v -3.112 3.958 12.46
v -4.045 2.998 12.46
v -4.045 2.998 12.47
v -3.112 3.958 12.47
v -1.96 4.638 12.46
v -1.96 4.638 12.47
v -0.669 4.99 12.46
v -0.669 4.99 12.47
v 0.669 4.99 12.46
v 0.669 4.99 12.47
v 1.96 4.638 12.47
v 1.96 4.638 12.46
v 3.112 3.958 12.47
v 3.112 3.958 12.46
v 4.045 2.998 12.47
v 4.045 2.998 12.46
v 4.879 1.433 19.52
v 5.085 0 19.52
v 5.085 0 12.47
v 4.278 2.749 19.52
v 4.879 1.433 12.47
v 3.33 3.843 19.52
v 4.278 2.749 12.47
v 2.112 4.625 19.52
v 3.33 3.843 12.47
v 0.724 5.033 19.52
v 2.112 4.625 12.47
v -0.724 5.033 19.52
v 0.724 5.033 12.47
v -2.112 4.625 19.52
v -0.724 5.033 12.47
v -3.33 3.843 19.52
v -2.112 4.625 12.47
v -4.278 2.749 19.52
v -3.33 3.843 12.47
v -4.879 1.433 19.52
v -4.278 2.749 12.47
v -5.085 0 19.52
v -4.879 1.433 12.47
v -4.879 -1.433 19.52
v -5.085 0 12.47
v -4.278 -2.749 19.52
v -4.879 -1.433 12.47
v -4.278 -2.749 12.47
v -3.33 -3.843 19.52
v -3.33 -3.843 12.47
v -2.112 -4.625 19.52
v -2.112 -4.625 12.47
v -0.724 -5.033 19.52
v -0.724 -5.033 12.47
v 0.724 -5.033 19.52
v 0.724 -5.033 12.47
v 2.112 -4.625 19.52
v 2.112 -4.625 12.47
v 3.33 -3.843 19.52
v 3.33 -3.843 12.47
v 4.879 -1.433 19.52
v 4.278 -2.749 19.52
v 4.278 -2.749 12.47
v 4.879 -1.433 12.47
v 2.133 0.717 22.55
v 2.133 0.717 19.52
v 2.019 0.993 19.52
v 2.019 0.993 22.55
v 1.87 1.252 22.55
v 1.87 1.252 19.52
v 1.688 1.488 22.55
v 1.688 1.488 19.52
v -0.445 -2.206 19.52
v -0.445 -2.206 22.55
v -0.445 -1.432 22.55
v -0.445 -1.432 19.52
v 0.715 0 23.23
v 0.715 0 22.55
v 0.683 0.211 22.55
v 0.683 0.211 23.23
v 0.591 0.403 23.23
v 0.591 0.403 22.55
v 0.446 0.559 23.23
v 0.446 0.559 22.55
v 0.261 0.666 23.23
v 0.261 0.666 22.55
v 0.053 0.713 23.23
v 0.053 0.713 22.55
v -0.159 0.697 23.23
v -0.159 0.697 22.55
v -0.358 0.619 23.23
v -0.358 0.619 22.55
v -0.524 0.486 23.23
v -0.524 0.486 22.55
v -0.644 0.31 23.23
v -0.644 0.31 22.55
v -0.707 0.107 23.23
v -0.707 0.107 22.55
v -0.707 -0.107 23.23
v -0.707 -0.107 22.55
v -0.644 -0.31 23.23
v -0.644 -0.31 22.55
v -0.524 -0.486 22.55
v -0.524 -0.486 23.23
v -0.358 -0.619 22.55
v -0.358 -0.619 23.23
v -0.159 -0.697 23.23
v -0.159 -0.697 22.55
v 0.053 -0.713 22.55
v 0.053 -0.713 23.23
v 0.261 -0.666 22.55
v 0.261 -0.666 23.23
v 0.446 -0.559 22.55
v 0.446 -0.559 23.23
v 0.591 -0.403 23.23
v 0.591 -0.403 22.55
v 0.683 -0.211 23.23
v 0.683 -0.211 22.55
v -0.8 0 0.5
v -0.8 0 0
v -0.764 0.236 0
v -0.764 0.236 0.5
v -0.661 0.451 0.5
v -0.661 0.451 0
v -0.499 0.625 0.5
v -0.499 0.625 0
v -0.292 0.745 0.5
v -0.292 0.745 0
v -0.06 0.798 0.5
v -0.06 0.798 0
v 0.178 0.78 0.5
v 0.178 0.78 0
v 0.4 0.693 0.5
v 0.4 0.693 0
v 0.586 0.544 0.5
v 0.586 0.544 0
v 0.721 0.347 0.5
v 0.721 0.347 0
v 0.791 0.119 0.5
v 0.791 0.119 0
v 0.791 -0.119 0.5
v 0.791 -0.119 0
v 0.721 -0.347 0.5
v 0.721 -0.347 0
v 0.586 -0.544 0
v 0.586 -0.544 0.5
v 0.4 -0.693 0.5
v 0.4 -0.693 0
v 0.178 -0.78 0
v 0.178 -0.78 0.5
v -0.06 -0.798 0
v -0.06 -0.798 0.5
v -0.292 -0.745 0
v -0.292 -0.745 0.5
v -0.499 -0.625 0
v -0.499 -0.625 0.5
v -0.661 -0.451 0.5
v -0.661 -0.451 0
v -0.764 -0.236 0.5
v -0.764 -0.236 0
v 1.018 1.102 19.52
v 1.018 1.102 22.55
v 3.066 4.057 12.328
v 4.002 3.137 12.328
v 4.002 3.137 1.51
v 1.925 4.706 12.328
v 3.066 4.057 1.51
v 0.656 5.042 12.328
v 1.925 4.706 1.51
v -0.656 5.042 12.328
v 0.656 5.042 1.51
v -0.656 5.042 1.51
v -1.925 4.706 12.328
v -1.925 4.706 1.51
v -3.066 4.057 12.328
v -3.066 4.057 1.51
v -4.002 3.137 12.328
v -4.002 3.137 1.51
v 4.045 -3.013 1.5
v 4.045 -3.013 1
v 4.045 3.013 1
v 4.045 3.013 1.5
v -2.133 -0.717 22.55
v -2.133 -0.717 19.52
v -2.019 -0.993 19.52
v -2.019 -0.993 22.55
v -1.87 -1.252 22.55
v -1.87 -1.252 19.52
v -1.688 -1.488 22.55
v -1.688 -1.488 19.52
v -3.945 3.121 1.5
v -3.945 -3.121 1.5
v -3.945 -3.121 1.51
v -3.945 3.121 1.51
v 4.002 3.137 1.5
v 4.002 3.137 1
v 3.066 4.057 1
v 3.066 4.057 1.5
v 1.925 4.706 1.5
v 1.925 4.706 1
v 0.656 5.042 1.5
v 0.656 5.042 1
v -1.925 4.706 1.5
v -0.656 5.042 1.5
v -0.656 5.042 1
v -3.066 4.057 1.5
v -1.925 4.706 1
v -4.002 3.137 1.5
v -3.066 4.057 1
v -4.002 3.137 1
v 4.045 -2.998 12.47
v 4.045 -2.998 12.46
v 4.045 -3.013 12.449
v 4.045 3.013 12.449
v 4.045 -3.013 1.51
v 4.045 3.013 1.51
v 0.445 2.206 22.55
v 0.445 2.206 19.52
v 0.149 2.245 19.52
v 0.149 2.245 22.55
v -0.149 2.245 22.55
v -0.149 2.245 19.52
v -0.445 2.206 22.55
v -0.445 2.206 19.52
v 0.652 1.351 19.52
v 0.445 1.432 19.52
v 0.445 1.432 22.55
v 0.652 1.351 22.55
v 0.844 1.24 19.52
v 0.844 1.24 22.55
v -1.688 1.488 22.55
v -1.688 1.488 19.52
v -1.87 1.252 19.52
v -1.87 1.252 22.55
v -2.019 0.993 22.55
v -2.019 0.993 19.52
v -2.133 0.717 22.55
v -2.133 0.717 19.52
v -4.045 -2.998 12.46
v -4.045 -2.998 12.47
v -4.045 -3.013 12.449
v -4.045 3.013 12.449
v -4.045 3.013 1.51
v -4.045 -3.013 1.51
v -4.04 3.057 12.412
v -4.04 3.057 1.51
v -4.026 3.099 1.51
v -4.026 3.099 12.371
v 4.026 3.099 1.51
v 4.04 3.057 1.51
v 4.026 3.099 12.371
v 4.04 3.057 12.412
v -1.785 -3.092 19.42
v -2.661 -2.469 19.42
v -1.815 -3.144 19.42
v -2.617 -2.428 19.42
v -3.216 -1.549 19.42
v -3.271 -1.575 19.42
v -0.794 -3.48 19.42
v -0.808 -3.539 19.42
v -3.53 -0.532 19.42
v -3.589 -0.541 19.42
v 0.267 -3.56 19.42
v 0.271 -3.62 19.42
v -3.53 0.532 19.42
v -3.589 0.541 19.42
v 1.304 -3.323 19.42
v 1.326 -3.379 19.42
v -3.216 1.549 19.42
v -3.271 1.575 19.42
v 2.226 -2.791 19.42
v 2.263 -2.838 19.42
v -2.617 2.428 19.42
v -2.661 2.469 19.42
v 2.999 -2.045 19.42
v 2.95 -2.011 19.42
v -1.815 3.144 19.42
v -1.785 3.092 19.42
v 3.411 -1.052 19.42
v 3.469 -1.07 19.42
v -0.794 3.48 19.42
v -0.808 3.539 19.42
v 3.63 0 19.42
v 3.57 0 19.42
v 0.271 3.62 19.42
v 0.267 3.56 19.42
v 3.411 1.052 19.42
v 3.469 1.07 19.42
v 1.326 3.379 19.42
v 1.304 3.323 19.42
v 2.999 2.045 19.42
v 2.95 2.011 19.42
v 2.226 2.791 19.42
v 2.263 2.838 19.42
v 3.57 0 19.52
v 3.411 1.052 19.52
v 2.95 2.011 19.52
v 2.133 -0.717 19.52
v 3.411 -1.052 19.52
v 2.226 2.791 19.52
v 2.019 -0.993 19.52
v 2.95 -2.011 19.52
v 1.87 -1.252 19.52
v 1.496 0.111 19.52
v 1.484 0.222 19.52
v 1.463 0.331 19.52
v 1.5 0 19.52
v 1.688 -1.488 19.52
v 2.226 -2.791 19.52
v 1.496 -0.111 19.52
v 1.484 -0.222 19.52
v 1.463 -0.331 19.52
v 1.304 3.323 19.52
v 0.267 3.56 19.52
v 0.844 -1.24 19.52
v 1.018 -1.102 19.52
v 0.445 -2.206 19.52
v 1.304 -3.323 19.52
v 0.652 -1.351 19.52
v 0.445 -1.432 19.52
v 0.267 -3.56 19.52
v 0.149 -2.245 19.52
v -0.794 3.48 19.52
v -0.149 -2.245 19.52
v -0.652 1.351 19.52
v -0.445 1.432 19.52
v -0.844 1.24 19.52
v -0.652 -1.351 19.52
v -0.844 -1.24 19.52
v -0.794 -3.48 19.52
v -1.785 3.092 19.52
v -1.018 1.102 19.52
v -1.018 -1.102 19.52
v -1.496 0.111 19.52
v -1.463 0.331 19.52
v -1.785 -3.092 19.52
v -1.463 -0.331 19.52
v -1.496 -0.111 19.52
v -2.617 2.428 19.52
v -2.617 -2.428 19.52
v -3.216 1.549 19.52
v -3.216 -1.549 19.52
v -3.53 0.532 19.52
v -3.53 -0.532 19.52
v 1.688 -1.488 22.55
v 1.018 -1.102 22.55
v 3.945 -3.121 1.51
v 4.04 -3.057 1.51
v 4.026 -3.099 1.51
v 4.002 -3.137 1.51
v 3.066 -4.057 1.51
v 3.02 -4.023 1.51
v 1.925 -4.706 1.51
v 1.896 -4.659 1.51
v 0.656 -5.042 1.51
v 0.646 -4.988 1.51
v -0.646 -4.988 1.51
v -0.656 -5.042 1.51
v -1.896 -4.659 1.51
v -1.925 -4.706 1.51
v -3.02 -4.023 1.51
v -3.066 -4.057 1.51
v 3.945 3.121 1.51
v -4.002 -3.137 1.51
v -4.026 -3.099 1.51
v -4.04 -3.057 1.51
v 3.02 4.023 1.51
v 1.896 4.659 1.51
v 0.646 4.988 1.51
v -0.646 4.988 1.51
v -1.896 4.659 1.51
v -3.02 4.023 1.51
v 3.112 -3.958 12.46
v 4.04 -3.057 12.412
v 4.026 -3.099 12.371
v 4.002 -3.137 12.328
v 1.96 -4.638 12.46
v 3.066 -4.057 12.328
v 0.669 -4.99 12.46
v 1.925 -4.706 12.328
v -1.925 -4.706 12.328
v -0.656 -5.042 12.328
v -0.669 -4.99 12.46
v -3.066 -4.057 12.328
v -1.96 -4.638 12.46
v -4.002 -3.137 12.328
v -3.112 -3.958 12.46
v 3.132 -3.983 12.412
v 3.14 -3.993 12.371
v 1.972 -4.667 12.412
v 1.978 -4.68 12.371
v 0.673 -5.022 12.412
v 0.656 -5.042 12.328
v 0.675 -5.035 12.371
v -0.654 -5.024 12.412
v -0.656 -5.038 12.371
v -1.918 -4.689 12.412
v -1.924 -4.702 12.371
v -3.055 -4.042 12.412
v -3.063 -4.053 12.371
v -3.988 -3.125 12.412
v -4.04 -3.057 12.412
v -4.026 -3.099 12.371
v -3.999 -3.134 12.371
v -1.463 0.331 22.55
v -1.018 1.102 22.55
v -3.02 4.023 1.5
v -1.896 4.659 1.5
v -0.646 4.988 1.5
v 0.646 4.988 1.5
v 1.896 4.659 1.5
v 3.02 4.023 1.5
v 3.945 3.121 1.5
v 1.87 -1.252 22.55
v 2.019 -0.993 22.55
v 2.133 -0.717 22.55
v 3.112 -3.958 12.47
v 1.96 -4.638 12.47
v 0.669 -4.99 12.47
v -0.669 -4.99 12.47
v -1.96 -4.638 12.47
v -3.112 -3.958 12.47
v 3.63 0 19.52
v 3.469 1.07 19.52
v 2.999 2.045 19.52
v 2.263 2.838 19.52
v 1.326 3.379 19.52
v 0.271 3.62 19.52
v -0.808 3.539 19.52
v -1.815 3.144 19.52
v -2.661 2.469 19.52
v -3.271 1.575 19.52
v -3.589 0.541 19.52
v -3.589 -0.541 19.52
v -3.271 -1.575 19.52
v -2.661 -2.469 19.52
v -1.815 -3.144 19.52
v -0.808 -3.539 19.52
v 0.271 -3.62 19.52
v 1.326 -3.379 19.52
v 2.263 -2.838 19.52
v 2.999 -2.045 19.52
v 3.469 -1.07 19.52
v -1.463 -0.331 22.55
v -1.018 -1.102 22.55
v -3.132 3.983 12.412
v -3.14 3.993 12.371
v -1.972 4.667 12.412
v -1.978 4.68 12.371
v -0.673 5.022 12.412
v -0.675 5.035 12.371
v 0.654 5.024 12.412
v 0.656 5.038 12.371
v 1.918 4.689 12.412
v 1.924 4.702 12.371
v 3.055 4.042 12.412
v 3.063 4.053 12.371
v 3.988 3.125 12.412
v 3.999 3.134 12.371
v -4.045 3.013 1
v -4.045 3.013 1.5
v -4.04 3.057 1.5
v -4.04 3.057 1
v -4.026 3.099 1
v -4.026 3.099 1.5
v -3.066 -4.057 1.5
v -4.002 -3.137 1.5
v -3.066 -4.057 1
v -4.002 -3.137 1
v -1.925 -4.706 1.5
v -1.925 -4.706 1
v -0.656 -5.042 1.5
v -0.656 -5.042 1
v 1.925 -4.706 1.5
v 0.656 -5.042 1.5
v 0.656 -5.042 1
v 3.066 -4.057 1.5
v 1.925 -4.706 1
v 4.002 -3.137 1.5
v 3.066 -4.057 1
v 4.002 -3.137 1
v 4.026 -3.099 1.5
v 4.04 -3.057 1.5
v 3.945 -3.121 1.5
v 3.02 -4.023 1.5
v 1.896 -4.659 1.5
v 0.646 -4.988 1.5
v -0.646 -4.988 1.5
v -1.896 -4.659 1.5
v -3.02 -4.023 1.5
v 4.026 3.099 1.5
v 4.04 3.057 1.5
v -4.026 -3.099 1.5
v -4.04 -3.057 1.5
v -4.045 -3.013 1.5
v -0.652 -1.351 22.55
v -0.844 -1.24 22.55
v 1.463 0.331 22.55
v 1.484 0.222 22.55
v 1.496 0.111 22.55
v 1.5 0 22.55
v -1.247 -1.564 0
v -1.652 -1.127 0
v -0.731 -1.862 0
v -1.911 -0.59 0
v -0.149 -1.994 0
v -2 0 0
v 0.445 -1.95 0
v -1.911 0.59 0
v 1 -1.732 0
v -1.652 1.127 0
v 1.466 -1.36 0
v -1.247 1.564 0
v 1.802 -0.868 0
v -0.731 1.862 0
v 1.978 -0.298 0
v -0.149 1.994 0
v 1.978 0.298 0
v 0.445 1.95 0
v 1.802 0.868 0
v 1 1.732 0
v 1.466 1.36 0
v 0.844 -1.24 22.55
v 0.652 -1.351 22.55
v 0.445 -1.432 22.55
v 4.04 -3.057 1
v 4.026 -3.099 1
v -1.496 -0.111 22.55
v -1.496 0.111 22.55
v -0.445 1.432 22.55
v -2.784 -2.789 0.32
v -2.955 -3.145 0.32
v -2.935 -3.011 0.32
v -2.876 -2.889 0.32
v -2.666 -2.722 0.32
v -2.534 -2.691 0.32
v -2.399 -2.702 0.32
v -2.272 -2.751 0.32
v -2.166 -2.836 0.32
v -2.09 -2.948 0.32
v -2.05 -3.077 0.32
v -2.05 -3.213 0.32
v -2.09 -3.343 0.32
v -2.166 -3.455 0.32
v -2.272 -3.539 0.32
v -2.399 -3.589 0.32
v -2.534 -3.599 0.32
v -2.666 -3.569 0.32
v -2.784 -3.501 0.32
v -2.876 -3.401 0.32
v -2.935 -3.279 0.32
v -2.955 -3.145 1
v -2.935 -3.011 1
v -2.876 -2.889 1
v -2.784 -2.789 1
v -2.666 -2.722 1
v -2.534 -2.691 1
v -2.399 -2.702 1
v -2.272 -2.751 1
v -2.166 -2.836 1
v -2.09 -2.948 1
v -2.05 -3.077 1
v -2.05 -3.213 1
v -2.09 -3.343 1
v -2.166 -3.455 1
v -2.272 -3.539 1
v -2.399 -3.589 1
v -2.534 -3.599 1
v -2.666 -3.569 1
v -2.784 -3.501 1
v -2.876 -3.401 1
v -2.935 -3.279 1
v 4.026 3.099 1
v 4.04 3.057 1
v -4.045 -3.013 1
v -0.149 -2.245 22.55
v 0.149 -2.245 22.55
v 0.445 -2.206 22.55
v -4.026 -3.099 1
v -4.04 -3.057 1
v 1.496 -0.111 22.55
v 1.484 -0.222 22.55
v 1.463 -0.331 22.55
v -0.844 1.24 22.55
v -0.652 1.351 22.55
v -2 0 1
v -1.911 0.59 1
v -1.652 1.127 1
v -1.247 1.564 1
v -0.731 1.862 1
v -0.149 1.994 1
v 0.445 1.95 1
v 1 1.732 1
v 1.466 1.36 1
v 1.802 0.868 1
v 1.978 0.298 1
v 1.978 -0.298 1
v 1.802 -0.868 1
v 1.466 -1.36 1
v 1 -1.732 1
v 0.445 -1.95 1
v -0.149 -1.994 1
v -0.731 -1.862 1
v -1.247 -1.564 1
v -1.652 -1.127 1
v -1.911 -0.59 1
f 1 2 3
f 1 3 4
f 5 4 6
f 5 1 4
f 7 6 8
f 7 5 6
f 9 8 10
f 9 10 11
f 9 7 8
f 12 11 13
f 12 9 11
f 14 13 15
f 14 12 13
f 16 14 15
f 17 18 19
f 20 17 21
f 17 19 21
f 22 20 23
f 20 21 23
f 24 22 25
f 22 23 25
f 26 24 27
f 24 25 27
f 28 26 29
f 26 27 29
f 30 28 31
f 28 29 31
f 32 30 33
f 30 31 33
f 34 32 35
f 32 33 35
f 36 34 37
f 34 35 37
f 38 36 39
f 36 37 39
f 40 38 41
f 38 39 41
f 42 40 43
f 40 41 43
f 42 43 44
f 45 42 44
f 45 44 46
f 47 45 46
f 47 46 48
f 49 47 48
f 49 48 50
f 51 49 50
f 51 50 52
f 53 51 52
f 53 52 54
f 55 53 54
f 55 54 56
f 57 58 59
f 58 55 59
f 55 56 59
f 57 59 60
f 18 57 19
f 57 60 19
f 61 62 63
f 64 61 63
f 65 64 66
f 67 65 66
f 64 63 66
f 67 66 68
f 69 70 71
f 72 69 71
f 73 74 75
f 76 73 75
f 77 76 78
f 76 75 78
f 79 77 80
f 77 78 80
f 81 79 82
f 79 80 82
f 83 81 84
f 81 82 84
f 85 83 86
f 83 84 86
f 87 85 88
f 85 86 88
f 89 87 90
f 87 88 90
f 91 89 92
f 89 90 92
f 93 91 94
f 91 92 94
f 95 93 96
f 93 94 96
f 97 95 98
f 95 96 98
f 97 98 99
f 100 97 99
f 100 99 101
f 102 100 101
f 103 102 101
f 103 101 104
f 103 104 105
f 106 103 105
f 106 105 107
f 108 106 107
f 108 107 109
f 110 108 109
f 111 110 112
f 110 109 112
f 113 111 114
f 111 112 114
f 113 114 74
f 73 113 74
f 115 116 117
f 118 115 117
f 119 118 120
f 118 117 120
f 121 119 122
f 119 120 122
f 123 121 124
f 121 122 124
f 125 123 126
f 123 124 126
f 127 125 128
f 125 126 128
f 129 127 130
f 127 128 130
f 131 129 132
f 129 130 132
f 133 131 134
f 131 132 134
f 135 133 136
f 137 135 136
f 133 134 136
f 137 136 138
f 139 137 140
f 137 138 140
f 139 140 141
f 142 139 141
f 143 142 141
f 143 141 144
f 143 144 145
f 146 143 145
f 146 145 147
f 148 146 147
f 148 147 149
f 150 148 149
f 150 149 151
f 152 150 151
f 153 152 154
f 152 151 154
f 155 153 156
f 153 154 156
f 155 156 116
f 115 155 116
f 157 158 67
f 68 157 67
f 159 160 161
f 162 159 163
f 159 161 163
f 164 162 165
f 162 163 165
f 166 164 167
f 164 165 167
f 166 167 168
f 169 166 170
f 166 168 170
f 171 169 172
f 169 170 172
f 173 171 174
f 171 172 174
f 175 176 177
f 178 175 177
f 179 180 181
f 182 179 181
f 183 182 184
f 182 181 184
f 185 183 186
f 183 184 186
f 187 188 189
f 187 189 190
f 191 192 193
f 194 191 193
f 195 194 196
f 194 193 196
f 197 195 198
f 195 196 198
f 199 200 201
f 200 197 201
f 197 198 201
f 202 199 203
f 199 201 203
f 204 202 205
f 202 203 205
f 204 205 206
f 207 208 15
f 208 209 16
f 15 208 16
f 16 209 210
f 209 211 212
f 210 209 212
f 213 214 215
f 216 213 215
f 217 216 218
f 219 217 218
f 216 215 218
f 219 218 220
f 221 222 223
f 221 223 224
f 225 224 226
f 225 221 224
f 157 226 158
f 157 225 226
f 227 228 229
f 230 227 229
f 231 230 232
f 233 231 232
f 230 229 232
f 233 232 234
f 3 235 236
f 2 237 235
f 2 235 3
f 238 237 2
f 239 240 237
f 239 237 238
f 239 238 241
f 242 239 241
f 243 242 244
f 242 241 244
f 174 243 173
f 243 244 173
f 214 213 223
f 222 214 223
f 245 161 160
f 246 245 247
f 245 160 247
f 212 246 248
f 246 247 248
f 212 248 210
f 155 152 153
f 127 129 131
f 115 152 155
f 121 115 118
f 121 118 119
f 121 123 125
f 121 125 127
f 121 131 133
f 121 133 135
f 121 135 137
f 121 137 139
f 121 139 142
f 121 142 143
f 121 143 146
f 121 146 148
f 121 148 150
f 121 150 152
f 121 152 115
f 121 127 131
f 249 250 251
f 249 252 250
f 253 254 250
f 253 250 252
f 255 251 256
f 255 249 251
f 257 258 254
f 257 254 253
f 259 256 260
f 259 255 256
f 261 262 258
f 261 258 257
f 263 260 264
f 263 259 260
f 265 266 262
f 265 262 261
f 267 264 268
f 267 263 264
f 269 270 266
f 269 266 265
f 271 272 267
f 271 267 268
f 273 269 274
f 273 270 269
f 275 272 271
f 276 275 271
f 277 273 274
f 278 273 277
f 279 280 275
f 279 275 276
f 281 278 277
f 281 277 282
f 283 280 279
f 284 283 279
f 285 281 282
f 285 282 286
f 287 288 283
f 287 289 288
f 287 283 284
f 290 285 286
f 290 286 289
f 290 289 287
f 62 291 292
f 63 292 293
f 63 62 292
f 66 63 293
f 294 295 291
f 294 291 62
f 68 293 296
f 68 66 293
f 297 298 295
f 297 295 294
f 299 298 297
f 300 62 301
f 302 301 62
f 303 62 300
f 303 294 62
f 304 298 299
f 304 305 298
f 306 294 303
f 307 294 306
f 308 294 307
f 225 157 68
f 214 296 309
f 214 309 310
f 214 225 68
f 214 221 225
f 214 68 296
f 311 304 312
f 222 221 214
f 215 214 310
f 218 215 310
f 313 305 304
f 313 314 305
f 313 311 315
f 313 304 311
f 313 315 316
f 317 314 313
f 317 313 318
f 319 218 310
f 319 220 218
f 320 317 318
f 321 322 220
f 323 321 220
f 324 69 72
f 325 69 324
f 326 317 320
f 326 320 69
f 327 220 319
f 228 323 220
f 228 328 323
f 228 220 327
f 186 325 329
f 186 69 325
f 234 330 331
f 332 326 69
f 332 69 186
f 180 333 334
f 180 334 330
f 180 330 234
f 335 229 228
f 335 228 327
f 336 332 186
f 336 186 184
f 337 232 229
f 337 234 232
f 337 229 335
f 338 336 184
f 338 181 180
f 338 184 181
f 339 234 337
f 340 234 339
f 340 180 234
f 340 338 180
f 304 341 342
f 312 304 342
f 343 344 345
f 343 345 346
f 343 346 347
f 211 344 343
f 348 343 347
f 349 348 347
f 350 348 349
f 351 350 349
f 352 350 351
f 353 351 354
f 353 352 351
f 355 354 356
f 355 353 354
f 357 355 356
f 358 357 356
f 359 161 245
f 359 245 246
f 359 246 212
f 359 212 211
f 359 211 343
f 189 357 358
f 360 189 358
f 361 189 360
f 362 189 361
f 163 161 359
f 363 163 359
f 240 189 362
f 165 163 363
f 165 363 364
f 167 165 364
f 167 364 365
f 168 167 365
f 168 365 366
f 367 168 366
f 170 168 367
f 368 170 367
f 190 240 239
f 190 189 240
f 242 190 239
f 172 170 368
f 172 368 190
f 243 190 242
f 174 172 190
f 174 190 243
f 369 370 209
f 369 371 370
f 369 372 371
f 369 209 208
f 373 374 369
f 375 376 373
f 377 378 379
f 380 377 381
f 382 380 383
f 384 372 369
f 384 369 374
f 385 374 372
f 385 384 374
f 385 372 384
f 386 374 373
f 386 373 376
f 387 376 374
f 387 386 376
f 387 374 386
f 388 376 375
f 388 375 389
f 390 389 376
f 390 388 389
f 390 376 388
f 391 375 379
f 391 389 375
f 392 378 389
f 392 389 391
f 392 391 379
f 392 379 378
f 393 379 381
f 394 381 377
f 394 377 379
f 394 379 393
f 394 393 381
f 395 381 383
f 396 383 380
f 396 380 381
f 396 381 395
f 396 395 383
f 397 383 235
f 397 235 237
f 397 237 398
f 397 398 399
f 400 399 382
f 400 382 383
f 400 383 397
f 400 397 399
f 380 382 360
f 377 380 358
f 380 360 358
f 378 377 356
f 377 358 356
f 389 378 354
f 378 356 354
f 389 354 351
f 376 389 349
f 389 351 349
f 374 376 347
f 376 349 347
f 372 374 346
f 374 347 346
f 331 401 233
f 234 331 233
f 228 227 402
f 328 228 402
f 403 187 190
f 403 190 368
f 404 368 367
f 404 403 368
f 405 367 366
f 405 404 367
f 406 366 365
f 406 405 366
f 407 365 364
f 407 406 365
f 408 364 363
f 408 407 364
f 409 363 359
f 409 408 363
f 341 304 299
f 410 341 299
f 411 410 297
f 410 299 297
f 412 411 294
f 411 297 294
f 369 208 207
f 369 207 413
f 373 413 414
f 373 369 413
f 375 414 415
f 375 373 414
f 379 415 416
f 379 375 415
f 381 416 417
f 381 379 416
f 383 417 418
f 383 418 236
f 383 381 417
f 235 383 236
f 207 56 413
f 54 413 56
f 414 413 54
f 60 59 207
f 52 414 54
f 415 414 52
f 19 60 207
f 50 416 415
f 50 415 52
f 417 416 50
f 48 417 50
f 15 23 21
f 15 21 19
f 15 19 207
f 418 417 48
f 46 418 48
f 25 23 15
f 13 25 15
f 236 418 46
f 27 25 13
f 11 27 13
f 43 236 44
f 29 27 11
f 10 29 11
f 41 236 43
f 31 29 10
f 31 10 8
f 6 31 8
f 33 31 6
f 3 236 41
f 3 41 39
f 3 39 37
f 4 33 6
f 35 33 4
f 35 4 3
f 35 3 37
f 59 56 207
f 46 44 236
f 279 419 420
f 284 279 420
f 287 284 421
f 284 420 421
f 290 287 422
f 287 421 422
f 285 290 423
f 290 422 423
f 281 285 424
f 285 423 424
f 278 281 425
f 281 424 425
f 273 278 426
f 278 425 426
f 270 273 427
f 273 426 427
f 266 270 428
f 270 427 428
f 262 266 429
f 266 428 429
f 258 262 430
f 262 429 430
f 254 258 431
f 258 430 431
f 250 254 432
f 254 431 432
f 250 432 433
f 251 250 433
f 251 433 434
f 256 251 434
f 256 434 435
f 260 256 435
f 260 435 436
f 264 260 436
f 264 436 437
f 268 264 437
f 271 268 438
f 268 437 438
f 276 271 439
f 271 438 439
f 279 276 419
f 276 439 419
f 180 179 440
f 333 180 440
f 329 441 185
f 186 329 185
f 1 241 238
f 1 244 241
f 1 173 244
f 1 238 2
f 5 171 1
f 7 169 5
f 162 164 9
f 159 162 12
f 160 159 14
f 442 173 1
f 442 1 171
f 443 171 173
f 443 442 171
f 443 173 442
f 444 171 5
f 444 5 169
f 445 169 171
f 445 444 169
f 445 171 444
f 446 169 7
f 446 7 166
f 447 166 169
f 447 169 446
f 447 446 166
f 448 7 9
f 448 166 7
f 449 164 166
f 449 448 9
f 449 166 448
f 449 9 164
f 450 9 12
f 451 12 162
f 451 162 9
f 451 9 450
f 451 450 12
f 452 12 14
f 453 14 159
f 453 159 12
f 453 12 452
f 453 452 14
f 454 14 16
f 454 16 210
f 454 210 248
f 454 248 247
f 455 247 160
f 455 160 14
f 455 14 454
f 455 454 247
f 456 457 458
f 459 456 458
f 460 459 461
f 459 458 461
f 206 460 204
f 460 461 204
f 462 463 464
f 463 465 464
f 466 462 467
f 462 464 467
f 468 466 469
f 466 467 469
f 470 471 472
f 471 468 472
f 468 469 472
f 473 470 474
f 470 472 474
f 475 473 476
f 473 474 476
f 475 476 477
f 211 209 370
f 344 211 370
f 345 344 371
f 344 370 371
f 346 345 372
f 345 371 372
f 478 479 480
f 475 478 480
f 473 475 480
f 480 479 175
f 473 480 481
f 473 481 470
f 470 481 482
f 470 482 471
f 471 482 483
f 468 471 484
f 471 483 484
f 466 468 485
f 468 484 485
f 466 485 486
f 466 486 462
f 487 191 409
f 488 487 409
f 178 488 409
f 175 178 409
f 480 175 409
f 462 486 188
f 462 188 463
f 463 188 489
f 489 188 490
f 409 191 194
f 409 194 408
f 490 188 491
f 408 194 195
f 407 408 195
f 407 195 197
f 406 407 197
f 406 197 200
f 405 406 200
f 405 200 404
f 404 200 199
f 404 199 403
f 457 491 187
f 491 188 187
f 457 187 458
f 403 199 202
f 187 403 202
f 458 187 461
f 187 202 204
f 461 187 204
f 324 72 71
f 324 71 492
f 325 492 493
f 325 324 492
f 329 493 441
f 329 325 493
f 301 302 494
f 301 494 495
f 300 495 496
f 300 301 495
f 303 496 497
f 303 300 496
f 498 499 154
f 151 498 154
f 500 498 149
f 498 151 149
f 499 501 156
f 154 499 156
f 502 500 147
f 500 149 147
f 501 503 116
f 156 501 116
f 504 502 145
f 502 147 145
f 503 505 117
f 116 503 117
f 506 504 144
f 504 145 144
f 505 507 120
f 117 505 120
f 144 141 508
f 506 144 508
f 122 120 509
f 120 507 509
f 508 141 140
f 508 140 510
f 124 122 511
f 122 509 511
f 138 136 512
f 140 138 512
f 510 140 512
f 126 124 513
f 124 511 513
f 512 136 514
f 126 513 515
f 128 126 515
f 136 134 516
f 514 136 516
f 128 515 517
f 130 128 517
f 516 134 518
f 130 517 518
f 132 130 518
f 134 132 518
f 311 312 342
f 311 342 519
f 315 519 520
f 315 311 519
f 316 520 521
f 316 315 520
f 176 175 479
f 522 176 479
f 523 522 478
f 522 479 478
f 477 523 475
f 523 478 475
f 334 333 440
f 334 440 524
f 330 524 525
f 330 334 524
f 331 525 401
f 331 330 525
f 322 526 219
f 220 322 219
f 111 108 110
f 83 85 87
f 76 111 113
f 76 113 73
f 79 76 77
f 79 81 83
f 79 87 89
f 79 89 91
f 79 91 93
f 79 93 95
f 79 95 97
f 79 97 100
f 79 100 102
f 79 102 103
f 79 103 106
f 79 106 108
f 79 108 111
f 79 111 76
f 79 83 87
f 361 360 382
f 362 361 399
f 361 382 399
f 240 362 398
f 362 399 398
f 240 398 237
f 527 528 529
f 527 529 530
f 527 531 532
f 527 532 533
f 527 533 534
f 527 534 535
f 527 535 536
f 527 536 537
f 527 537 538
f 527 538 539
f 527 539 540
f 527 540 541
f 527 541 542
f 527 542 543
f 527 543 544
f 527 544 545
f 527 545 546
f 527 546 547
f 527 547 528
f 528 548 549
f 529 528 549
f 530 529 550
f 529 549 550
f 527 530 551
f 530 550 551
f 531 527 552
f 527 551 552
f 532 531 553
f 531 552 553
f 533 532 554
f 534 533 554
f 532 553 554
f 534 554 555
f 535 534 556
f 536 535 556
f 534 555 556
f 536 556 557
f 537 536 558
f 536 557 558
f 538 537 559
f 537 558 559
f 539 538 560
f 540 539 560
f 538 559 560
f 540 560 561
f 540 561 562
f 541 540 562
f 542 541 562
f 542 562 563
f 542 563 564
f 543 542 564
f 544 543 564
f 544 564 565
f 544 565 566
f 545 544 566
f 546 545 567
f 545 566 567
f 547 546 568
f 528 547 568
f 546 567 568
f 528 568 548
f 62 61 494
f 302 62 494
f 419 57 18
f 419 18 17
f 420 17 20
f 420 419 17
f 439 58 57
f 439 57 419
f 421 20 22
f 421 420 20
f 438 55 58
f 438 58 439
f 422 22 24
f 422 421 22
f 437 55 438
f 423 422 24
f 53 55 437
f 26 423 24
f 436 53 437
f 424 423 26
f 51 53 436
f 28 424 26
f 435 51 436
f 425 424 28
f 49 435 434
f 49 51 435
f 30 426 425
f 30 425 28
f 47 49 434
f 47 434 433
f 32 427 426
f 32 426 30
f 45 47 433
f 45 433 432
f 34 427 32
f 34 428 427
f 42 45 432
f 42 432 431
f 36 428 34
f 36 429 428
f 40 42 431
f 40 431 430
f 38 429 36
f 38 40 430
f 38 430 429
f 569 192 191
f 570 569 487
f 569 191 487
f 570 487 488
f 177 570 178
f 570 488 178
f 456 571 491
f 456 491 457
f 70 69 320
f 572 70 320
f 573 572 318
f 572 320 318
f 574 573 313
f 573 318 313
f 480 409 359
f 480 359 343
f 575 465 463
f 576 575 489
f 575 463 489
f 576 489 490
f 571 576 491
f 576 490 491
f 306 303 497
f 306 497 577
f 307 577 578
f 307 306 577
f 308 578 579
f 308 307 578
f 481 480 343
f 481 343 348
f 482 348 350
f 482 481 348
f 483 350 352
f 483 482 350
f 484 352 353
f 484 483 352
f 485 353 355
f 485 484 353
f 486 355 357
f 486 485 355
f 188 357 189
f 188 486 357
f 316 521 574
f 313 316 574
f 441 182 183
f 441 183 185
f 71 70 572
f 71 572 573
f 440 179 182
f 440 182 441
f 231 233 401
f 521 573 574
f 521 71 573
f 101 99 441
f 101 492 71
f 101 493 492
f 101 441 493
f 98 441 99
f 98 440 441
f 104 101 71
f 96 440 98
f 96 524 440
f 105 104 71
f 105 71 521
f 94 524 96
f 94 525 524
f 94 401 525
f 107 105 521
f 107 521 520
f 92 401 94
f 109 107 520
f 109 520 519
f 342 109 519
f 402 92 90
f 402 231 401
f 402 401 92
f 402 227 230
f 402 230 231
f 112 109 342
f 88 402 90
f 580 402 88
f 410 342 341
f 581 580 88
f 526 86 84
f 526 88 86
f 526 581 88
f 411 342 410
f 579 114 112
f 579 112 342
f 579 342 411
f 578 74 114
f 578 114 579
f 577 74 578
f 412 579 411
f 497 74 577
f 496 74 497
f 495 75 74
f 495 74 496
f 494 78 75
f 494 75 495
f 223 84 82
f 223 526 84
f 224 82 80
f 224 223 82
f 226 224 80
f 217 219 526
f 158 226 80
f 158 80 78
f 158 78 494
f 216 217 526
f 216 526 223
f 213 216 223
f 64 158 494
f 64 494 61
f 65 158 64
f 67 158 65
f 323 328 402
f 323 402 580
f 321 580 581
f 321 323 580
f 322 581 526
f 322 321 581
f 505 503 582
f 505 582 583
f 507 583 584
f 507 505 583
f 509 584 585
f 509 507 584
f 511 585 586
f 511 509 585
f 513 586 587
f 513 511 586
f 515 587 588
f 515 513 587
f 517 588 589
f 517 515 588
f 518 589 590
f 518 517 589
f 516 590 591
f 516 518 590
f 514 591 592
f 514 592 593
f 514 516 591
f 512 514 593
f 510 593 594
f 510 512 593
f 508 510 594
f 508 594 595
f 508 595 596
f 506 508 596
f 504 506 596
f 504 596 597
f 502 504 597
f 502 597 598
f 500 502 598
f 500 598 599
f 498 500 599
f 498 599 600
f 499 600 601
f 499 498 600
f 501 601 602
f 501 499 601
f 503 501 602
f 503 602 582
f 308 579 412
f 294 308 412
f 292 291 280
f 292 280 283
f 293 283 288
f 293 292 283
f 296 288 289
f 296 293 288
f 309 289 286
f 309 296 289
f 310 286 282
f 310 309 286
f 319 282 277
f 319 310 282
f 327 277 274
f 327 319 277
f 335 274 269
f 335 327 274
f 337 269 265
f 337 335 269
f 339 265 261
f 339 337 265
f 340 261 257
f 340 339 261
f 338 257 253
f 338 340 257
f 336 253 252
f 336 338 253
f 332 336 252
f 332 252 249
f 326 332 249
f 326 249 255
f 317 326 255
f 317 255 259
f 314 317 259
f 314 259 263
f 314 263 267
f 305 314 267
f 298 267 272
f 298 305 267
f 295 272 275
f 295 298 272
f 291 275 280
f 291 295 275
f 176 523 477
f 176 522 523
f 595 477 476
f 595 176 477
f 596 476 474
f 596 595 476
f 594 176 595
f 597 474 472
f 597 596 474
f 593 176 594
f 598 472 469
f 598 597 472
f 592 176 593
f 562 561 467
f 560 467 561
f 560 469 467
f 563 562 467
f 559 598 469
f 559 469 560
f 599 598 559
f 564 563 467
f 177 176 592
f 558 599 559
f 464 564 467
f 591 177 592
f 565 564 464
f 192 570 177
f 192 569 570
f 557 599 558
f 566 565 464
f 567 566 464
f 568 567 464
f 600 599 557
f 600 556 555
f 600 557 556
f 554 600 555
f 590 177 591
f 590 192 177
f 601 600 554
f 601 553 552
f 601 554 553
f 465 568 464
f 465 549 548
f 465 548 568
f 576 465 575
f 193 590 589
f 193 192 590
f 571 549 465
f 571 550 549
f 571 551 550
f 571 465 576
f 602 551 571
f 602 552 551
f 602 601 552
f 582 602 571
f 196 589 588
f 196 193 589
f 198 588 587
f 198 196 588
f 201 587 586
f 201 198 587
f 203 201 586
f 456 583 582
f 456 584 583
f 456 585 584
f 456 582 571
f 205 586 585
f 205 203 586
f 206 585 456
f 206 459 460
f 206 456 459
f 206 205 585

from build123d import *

# Parameters (mm, degrees)
SKETCH1_R           = 5.085
BOSS_EXTRUDE1_DEPTH = 23.23
SKETCH2_R           = 5.085
SKETCH2_R_2         = 2
CUT_EXTRUDE1_DEPTH  = 1
SKETCH4_R           = 0.8
CUT_EXTRUDE2_DEPTH  = 0.5
SKETCH5_W           = 3.99879876
SKETCH5_H           = 10.17
SKETCH5_W_2         = 3.491908776
CUT_EXTRUDE3_DEPTH  = 12.47
CUT_EXTRUDE4_START  = -3.71
SKETCH6_R           = 5.085
SKETCH6_R_2         = 2.25
CUT_EXTRUDE4_DEPTH  = 3.71
SKETCH7_R           = 3.63
SKETCH7_R_2         = 3.57
CUT_EXTRUDE5_DEPTH  = 0.1
CUT_EXTRUDE6_START  = -0.68
SKETCH8_R           = 2.25
SKETCH8_R_2         = 0.715
CUT_EXTRUDE6_DEPTH  = 0.68
CUT_EXTRUDE7_START  = -3.03
CUT_EXTRUDE7_DEPTH  = 3.03
SKETCH10_R          = 0.455
BOSS_EXTRUDE2_DEPTH = 0.68
CUT_EXTRUDE8_START  = 0.01
SKETCH11_R          = 5.085
SKETCH11_R_2        = 5.035
CUT_EXTRUDE8_DEPTH  = 0.01
FILLET3_R           = 0.2
CUT_EXTRUDE9_DEPTH  = 0.01


with BuildPart() as part:
    # Sketch1 → Boss-Extrude1 (new body)
    with BuildSketch(Plane.XY):
        Circle(SKETCH1_R)
    extrude(amount=BOSS_EXTRUDE1_DEPTH)

    # Sketch2 → Cut-Extrude1 (cut)
    with BuildSketch(Plane(origin=(0, 0, 0), x_dir=(-1, 0, 0), z_dir=(0, 0, -1))):
        Circle(SKETCH2_R)
        Circle(SKETCH2_R_2, mode=Mode.SUBTRACT)
    extrude(amount=-CUT_EXTRUDE1_DEPTH, mode=Mode.SUBTRACT)

    # Sketch4 → Cut-Extrude2 (cut)
    with BuildSketch(Plane(origin=(0, 0, 0), x_dir=(-1, 0, 0), z_dir=(0, 0, -1))):
        Circle(SKETCH4_R)
    extrude(amount=-CUT_EXTRUDE2_DEPTH, mode=Mode.SUBTRACT)

    # Sketch5 → Cut-Extrude3 (cut)
    with BuildSketch(Plane(origin=(0, 0, 0), x_dir=(-1, 0, 0), z_dir=(0, 0, -1))):
        with Locations((6.04439938, 0)):
            Rectangle(SKETCH5_W, SKETCH5_H)
        with Locations((-5.790954388, 0)):
            Rectangle(SKETCH5_W_2, SKETCH5_H)
    extrude(amount=-CUT_EXTRUDE3_DEPTH, mode=Mode.SUBTRACT)

    # Sketch6 → Cut-Extrude4 (cut)
    with BuildSketch(Plane.XY.offset(23.23).offset(CUT_EXTRUDE4_START)):
        with Locations(Location((0, 0, 0), (0, 0, 142.7003226))):
            Circle(SKETCH6_R)
        Circle(SKETCH6_R_2, mode=Mode.SUBTRACT)
    extrude(amount=CUT_EXTRUDE4_DEPTH, mode=Mode.SUBTRACT)

    # Sketch7 → Cut-Extrude5 (cut)
    with BuildSketch(Plane.XY.offset(19.52)):
        Circle(SKETCH7_R)
        Circle(SKETCH7_R_2, mode=Mode.SUBTRACT)
    extrude(amount=-CUT_EXTRUDE5_DEPTH, mode=Mode.SUBTRACT)

    # Sketch8 → Cut-Extrude6 (cut)
    with BuildSketch(Plane.XY.offset(23.23).offset(CUT_EXTRUDE6_START)):
        Circle(SKETCH8_R)
        Circle(SKETCH8_R_2, mode=Mode.SUBTRACT)
    extrude(amount=CUT_EXTRUDE6_DEPTH, mode=Mode.SUBTRACT)

    # Sketch9 → Cut-Extrude7 (cut)
    with BuildSketch(Plane.XY.offset(22.55).offset(CUT_EXTRUDE7_START)):
        with BuildLine():
            ThreePointArc((-1.018056831, 1.101617125), (-0.75, 1.299038106), (-0.445, 1.43247164))
            Line((-0.445, 1.43247164), (-0.445, 2.205555486))
            ThreePointArc((-0.445, 2.205555486), (-1.125, 1.948557159), (-1.68756708, 1.488159047))
            Line((-1.68756708, 1.488159047), (-1.018056831, 1.101617125))
        make_face()
        with BuildLine():
            Line((0.445, 2.205555486), (0.445, 1.43247164))
            ThreePointArc((0.445, 1.43247164), (0.75, 1.299038106), (1.018056831, 1.101617125))
            Line((1.018056831, 1.101617125), (1.68756708, 1.488159047))
            ThreePointArc((1.68756708, 1.488159047), (1.125, 1.948557159), (0.445, 2.205555486))
        make_face()
        with BuildLine():
            Line((2.13256708, 0.717396438), (1.463056831, 0.330854515))
            ThreePointArc((1.463056831, 0.330854515), (1.490735598, 0.16645533), (1.5, 0))
            ThreePointArc((1.5, 0), (1.490735598, -0.16645533), (1.463056831, -0.330854515))
            Line((1.463056831, -0.330854515), (2.13256708, -0.717396438))
            ThreePointArc((2.13256708, -0.717396438), (2.220447695, -0.363472193), (2.25, 0))
            ThreePointArc((2.25, 0), (2.220447695, 0.363472193), (2.13256708, 0.717396438))
        make_face()
        with BuildLine():
            Line((1.68756708, -1.488159047), (1.018056831, -1.101617125))
            ThreePointArc((1.018056831, -1.101617125), (0.75, -1.299038106), (0.445, -1.43247164))
            Line((0.445, -1.43247164), (0.445, -2.205555486))
            ThreePointArc((0.445, -2.205555486), (1.125, -1.948557159), (1.68756708, -1.488159047))
        make_face()
        with BuildLine():
            ThreePointArc((-0.445, -1.43247164), (-0.75, -1.299038106), (-1.018056831, -1.101617125))
            Line((-1.018056831, -1.101617125), (-1.68756708, -1.488159047))
            ThreePointArc((-1.68756708, -1.488159047), (-1.125, -1.948557159), (-0.445, -2.205555486))
            Line((-0.445, -2.205555486), (-0.445, -1.43247164))
        make_face()
        with BuildLine():
            ThreePointArc((-1.463056831, -0.330854515), (-1.5, 0), (-1.463056831, 0.330854515))
            Line((-1.463056831, 0.330854515), (-2.13256708, 0.717396438))
            ThreePointArc((-2.13256708, 0.717396438), (-2.25, 0), (-2.13256708, -0.717396438))
            Line((-2.13256708, -0.717396438), (-1.463056831, -0.330854515))
        make_face()
    extrude(amount=CUT_EXTRUDE7_DEPTH, mode=Mode.SUBTRACT)

    # Sketch10 → Boss-Extrude2 (add)
    with BuildSketch(Plane(origin=(0, 0, 1), x_dir=(-1, 0, 0), z_dir=(0, 0, -1))):
        with Locations((2.5, -3.145160742)):
            Circle(SKETCH10_R)
    extrude(amount=BOSS_EXTRUDE2_DEPTH)

    # Sketch11 → Cut-Extrude8 (cut)
    with BuildSketch(Plane(origin=(0, 0, 12.47), x_dir=(-1, 0, 0), z_dir=(0, 0, -1)).offset(CUT_EXTRUDE8_START)):
        Circle(SKETCH11_R)
        Circle(SKETCH11_R_2, mode=Mode.SUBTRACT)
    extrude(amount=-CUT_EXTRUDE8_DEPTH, mode=Mode.SUBTRACT)

    # Fillet3
    # the kernel refuses this fillet: 0.2 mm, written as the material it takes off along each edge
    with BuildSketch(Plane(origin=(0, 0, 12.46), x_dir=(-0.8331991700608187, 0.5529730038708609, 0), z_dir=(-0.5529730038708609, -0.8331991700608187, 0))) as fillet3_piece_1:
        with BuildLine():
            CenterArc((4.885, 0.132287566), FILLET3_R, 318.590377891, 41.409622109)
            Line((5.035, 0), (5.085, 0))
            Line((5.085, 0), (5.085, 0.132287566))
        make_face()
    fillet3_piece_1_solid = revolve(axis=Axis((0, 0, 12.46), (0, 0, -1)), revolution_arc=112.857572989, mode=Mode.PRIVATE)
    with BuildSketch(Plane(origin=(0, 0, 12.46), x_dir=(0.8331991700608224, -0.5529730038708549, 0), z_dir=(0.5529730038708549, 0.8331991700608224, 0))) as fillet3_piece_2:
        with BuildLine():
            CenterArc((4.885, 0.132287566), FILLET3_R, 318.590377891, 41.409622109)
            Line((5.085, 0.132287566), (5.085, 0))
            Line((5.085, 0), (5.035, 0))
        make_face()
    fillet3_piece_2_solid = revolve(axis=Axis((0, 0, 12.46), (0, 0, -1)), revolution_arc=112.857572989, mode=Mode.PRIVATE)
    with BuildSketch(Plane(origin=(-4.045, 3.08142824, 12.46), x_dir=(0.6114168469415571, 0.7913086877294123, 0), z_dir=(0, 0, -1))) as fillet3_piece_3:
        with BuildLine():
            CenterArc((0.068270891, 0.199995311), FILLET3_R, 232.307979121, 38.084364359)
            Line((-0.054012478, 0.041733573), (0, 0))
            ThreePointArc((0, 0), (0.034820209, -0.000119219), (0.069640417, 0))
        make_face()
    fillet3_piece_3_solid = extrude(amount=11.634101044, mode=Mode.PRIVATE)
    with BuildSketch(Plane(origin=(-4.045, -3.08142824, 12.46), x_dir=(0.6114168469415588, -0.7913086877294109, 0), z_dir=(0, 0, -1)), Plane(origin=(4.045, 3.08142824, 12.46), x_dir=(-0.6114168469415571, 0.7913086877294123, 0), z_dir=(0, 0, -1))) as fillet3_piece_4:
        with BuildLine():
            CenterArc((0.068270891, -0.199995311), FILLET3_R, 89.60765652, 38.084364359)
            Line((-0.054012478, -0.041733573), (0, 0))
            ThreePointArc((0, 0), (0.034820209, 0.000119219), (0.069640417, 0))
        make_face()
    fillet3_piece_4_solid = extrude(amount=11.634101044, mode=Mode.PRIVATE)
    with BuildSketch(Plane(origin=(4.045, -3.08142824, 12.46), x_dir=(0, 1, 0), z_dir=(0, 0, -1))) as fillet3_piece_5:
        with BuildLine():
            CenterArc((0.068257153, -0.2), FILLET3_R, 90, 38.084364359)
            ThreePointArc((-0.055107067, -0.042579324), (-0.027626426, -0.021195323), (0, 0))
            Line((0, 0), (0.068257153, 0))
        make_face()
    fillet3_piece_5_solid = extrude(amount=11.634101044, mode=Mode.PRIVATE)
    add([fillet3_piece_1_solid, fillet3_piece_2_solid, fillet3_piece_3_solid, fillet3_piece_4_solid, fillet3_piece_5_solid], mode=Mode.SUBTRACT)

    # Sketch15 → Cut-Extrude9 (cut)
    with BuildSketch(Plane(origin=(0, 0, 1.5), x_dir=(-1, 0, 0), z_dir=(0, 0, -1))):
        with BuildLine():
            Line((4.045, -3.013171087), (4.045, 3.013171087))
            ThreePointArc((4.045, 3.013171087), (4.034055726, 3.078423922), (4.002420676, 3.136535308))
            ThreePointArc((4.002420676, 3.136535308), (0, 5.085), (-4.002420676, 3.136535308))
            ThreePointArc((-4.002420676, 3.136535308), (-4.034055726, 3.078423922), (-4.045, 3.013171087))
            Line((-4.045, 3.013171087), (-4.045, -3.013171087))
            ThreePointArc((-4.045, -3.013171087), (-4.034055726, -3.078423922), (-4.002420676, -3.136535308))
            ThreePointArc((-4.002420676, -3.136535308), (0, -5.085), (4.002420676, -3.136535308))
            ThreePointArc((4.002420676, -3.136535308), (4.034055726, -3.078423922), (4.045, -3.013171087))
        make_face()
        with BuildLine():
            Line((-3.945, 3.120556841), (-3.945, -3.120556841))
            ThreePointArc((-3.945, -3.120556841), (0, -5.03), (3.945, -3.120556841))
            Line((3.945, -3.120556841), (3.945, 3.120556841))
            ThreePointArc((3.945, 3.120556841), (-0.000264914, 5.029999993), (-3.945, 3.120556841))
        make_face(mode=Mode.SUBTRACT)
    extrude(amount=-CUT_EXTRUDE9_DEPTH, mode=Mode.SUBTRACT)


solid = part.part
